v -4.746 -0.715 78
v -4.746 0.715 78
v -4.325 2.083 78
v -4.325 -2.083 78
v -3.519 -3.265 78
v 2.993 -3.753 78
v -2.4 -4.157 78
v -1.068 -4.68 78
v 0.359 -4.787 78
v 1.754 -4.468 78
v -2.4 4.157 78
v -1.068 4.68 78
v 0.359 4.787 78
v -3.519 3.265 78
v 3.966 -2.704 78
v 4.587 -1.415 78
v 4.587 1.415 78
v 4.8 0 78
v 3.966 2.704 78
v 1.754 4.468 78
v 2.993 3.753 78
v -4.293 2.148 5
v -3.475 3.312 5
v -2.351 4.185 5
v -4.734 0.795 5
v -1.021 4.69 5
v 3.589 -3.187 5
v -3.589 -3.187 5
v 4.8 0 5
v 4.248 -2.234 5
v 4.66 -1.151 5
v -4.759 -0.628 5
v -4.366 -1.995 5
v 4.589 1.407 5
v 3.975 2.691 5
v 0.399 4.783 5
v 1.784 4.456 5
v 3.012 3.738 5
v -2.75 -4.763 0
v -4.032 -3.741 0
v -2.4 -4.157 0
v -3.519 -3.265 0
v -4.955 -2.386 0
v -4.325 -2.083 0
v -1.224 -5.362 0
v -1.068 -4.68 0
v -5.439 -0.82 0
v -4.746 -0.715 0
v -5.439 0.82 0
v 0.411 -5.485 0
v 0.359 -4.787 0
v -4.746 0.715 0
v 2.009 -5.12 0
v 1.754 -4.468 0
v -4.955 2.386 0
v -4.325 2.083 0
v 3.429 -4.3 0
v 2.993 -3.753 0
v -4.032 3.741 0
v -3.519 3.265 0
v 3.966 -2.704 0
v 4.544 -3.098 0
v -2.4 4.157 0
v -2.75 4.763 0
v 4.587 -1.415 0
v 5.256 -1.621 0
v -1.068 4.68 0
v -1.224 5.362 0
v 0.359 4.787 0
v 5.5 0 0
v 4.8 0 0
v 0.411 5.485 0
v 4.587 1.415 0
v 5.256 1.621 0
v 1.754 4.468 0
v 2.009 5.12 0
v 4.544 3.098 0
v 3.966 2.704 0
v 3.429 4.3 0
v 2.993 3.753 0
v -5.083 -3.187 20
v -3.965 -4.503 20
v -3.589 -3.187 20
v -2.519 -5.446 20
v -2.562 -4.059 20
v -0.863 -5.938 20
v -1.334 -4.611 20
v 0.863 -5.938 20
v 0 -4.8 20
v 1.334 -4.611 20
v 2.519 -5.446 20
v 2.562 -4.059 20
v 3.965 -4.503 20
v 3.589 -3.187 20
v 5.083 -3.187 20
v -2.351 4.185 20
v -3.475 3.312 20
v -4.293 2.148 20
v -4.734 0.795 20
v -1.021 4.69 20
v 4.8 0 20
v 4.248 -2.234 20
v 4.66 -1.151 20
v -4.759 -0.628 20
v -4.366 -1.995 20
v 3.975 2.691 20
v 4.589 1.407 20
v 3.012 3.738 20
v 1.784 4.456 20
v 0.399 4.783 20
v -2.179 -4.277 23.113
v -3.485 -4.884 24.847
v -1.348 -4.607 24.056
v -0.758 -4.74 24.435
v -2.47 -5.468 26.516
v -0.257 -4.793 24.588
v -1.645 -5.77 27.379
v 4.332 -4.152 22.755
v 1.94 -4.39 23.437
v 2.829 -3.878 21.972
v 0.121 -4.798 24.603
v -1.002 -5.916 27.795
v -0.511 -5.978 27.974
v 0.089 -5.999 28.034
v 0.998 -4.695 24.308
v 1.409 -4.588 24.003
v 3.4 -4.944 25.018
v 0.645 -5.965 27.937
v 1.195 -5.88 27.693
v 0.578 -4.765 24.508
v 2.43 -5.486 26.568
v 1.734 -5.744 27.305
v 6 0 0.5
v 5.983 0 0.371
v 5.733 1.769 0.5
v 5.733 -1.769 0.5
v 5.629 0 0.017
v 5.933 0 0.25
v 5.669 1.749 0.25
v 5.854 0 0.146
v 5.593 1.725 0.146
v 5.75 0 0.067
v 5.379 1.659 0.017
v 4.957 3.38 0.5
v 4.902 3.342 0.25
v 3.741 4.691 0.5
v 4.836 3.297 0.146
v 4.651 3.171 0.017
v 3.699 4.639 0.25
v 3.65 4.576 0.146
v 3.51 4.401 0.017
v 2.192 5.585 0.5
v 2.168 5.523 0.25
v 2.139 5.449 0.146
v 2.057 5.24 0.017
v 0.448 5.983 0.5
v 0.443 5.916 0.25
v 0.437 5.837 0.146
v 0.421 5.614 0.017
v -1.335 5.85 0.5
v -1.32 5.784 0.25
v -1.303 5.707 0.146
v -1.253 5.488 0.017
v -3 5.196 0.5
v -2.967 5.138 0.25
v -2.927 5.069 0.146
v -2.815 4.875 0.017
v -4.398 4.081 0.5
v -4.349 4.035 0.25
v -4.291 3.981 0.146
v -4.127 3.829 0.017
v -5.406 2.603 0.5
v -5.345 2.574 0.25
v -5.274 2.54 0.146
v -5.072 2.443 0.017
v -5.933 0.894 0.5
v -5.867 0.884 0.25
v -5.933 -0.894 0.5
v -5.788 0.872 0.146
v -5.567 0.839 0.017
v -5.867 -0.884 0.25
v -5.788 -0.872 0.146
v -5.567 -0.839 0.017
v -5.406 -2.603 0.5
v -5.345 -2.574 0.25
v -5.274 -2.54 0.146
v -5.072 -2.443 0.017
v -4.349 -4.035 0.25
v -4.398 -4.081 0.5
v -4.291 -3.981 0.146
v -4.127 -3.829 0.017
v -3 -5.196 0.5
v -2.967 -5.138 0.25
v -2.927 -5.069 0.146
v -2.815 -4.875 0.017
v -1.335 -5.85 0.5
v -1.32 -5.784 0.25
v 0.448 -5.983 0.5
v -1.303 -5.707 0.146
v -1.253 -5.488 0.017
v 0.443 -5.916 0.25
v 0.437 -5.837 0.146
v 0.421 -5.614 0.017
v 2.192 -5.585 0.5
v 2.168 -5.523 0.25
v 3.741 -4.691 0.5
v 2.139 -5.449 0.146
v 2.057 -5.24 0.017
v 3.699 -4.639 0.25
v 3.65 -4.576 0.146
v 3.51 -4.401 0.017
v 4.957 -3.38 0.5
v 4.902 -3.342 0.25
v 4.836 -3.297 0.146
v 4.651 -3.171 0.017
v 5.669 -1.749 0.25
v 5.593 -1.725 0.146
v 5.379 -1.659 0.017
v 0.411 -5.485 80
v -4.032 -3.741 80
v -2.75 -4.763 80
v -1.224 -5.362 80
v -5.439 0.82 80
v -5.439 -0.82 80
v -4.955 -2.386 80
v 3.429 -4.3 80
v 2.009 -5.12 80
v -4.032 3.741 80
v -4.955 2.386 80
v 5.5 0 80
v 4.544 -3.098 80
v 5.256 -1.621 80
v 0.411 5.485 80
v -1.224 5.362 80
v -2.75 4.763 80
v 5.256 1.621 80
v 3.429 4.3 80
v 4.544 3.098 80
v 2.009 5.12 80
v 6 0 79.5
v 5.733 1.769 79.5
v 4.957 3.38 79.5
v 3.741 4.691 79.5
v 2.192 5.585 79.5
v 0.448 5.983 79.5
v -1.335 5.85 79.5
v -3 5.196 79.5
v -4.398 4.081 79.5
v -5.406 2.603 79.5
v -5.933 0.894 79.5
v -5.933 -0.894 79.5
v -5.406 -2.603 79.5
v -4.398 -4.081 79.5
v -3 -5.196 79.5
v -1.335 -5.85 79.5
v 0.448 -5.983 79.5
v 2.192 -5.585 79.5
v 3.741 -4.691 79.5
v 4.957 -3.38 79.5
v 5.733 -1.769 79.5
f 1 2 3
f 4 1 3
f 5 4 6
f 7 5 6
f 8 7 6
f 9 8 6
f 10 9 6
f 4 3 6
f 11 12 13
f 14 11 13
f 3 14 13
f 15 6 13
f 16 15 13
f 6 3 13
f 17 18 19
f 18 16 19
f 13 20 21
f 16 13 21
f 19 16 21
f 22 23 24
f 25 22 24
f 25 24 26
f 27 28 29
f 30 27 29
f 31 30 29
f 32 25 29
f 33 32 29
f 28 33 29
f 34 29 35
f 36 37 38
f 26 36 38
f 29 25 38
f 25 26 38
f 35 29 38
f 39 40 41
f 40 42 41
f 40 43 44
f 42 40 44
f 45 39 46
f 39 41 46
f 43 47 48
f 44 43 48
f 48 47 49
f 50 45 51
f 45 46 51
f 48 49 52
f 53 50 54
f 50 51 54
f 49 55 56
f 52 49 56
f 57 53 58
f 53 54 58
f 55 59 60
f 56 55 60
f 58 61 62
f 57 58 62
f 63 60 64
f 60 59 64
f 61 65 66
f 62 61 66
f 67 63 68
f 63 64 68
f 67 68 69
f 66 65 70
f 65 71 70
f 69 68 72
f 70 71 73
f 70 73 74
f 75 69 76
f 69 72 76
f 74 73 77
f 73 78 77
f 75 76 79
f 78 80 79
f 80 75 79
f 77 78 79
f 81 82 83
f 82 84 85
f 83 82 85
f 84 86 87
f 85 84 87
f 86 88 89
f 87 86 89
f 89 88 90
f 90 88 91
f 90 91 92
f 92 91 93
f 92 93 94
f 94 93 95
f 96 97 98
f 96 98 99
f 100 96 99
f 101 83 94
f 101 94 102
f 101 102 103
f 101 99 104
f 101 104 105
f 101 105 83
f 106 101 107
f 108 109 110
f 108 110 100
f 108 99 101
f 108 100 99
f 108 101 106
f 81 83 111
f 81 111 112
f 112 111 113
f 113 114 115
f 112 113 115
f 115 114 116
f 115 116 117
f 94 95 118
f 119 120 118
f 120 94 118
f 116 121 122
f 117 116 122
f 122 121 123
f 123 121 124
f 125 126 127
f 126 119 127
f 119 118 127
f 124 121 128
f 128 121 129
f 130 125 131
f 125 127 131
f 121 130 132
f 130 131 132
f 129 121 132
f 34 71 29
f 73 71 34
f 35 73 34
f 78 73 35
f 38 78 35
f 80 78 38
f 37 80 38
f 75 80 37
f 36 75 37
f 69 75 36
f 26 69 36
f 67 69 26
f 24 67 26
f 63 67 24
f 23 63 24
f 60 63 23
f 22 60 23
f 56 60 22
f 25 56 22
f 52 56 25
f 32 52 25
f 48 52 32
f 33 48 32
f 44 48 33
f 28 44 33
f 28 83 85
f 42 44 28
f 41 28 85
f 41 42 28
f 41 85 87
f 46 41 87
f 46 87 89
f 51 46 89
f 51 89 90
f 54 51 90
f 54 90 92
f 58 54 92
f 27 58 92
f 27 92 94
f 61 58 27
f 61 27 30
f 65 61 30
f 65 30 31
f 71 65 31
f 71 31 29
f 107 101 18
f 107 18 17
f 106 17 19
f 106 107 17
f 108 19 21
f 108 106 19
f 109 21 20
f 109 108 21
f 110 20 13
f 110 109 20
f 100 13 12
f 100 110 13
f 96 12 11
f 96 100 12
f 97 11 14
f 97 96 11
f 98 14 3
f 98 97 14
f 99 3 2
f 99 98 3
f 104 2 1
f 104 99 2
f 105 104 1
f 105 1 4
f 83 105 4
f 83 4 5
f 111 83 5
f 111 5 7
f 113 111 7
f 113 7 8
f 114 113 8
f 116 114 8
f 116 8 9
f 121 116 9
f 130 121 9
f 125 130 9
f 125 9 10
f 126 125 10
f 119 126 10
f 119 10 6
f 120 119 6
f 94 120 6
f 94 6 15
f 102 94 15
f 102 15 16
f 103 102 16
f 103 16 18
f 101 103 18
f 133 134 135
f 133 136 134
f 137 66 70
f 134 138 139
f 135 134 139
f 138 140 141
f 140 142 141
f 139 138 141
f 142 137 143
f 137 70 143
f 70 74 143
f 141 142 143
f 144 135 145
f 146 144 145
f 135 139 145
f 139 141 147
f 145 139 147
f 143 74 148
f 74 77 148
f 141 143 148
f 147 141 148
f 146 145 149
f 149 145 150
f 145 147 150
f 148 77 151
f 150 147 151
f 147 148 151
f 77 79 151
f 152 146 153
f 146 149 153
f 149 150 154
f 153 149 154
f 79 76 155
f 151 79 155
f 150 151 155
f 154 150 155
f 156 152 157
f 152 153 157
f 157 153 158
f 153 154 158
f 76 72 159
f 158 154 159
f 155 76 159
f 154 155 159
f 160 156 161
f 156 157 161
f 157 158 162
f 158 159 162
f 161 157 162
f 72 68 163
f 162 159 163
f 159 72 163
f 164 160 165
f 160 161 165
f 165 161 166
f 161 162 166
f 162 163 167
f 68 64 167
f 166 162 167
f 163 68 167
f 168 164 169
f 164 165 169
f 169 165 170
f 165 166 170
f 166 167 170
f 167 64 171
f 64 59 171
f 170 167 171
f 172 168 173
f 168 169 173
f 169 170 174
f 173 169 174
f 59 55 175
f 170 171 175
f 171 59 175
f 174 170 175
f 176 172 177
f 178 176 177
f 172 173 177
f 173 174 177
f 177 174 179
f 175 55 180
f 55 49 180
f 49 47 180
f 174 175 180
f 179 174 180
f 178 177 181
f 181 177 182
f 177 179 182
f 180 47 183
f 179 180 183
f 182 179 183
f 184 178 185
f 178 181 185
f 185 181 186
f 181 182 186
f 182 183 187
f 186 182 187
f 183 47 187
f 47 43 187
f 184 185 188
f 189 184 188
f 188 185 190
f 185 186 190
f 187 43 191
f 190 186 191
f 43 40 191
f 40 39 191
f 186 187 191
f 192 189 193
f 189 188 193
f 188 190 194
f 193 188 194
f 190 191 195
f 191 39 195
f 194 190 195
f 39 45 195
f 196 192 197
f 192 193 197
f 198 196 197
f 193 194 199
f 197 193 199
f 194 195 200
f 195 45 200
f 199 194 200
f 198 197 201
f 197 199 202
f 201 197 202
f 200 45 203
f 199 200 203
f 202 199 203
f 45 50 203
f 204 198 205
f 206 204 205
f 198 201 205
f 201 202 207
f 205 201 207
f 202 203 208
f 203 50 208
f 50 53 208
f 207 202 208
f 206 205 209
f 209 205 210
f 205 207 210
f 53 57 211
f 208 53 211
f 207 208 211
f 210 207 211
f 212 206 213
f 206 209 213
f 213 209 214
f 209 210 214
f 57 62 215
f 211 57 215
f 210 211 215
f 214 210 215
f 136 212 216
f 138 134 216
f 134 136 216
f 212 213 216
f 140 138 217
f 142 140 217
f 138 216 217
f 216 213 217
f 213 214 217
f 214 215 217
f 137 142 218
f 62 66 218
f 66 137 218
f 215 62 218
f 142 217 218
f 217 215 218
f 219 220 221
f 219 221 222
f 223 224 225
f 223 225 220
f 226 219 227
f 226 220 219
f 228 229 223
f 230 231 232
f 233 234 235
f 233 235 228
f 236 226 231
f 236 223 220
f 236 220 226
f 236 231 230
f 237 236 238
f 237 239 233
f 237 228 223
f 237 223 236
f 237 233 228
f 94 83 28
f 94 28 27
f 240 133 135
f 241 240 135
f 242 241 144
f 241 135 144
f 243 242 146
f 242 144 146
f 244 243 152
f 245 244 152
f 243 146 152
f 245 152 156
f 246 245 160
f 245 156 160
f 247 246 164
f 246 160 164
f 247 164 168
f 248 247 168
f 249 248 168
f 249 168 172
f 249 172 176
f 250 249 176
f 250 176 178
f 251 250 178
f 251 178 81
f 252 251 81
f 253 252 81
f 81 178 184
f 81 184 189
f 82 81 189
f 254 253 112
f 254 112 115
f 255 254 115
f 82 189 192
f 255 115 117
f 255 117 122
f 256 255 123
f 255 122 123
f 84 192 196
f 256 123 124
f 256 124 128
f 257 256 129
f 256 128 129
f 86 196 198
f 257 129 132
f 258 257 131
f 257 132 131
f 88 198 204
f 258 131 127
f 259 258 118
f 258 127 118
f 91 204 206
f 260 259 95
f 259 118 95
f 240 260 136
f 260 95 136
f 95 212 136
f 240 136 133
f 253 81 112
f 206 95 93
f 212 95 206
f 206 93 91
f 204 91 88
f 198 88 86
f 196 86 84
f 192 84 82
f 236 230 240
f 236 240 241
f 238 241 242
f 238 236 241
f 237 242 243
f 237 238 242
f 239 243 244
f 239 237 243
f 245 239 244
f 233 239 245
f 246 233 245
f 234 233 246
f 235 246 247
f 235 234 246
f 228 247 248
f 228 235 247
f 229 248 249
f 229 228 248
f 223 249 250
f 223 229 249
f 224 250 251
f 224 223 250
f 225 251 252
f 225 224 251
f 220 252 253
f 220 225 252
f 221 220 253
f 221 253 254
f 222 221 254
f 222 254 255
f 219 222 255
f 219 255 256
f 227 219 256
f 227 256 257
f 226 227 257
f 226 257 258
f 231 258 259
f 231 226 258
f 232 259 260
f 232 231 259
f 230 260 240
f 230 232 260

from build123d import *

# Parameters (mm, degrees)
F0_R     = 6
F0_R_2   = 4.8
F1_DEPTH = 80
F3_DEPTH = 12.5
F5_DEPTH = 15
F6_R     = 4.8
F7_DEPTH = 2
F8_R     = 0.5
F9_SIZE  = 0.5


with BuildPart() as f1:
    # F0 (on Top) → F1 (new body)
    with BuildSketch(Plane.XY):
        Circle(F0_R)
        Circle(F0_R_2, mode=Mode.SUBTRACT)
    extrude(amount=F1_DEPTH)

    # F2 (on Right) → F3 (cut, symmetric)
    with BuildSketch(Plane.YZ):
        Polygon((-6.6873627901, 30), (-6.6873627901, 20), (-3.1873627901, 20), align=None)
    extrude(amount=F3_DEPTH, both=True, mode=Mode.SUBTRACT)

    # F4 (on face) → F5 (join)
    with BuildSketch(Plane.XY.offset(20)):
        with BuildLine():
            Line((-3.5889717809, -3.1873627901), (3.5889717809, -3.1873627901))
            ThreePointArc((3.5889717809, -3.1873627901), (0, 4.8), (-3.5889717809, -3.1873627901))
        make_face()
    extrude(amount=-F5_DEPTH)

    # F6 (on face) → F7 (join)
    with BuildSketch(Plane.XY.offset(80)):
        Circle(F6_R)
    extrude(amount=-F7_DEPTH)

    # F8
    f8_edges = [f1.edges().sort_by_distance(p)[0] for p in [
        (-6, 0, 0),
    ]]
    fillet(f8_edges, radius=F8_R)

    # F9
    f9_edges = [f1.edges().sort_by_distance(p)[0] for p in [
        (-6, 0, 80),
    ]]
    chamfer(f9_edges, length=F9_SIZE)


solid = f1.part
